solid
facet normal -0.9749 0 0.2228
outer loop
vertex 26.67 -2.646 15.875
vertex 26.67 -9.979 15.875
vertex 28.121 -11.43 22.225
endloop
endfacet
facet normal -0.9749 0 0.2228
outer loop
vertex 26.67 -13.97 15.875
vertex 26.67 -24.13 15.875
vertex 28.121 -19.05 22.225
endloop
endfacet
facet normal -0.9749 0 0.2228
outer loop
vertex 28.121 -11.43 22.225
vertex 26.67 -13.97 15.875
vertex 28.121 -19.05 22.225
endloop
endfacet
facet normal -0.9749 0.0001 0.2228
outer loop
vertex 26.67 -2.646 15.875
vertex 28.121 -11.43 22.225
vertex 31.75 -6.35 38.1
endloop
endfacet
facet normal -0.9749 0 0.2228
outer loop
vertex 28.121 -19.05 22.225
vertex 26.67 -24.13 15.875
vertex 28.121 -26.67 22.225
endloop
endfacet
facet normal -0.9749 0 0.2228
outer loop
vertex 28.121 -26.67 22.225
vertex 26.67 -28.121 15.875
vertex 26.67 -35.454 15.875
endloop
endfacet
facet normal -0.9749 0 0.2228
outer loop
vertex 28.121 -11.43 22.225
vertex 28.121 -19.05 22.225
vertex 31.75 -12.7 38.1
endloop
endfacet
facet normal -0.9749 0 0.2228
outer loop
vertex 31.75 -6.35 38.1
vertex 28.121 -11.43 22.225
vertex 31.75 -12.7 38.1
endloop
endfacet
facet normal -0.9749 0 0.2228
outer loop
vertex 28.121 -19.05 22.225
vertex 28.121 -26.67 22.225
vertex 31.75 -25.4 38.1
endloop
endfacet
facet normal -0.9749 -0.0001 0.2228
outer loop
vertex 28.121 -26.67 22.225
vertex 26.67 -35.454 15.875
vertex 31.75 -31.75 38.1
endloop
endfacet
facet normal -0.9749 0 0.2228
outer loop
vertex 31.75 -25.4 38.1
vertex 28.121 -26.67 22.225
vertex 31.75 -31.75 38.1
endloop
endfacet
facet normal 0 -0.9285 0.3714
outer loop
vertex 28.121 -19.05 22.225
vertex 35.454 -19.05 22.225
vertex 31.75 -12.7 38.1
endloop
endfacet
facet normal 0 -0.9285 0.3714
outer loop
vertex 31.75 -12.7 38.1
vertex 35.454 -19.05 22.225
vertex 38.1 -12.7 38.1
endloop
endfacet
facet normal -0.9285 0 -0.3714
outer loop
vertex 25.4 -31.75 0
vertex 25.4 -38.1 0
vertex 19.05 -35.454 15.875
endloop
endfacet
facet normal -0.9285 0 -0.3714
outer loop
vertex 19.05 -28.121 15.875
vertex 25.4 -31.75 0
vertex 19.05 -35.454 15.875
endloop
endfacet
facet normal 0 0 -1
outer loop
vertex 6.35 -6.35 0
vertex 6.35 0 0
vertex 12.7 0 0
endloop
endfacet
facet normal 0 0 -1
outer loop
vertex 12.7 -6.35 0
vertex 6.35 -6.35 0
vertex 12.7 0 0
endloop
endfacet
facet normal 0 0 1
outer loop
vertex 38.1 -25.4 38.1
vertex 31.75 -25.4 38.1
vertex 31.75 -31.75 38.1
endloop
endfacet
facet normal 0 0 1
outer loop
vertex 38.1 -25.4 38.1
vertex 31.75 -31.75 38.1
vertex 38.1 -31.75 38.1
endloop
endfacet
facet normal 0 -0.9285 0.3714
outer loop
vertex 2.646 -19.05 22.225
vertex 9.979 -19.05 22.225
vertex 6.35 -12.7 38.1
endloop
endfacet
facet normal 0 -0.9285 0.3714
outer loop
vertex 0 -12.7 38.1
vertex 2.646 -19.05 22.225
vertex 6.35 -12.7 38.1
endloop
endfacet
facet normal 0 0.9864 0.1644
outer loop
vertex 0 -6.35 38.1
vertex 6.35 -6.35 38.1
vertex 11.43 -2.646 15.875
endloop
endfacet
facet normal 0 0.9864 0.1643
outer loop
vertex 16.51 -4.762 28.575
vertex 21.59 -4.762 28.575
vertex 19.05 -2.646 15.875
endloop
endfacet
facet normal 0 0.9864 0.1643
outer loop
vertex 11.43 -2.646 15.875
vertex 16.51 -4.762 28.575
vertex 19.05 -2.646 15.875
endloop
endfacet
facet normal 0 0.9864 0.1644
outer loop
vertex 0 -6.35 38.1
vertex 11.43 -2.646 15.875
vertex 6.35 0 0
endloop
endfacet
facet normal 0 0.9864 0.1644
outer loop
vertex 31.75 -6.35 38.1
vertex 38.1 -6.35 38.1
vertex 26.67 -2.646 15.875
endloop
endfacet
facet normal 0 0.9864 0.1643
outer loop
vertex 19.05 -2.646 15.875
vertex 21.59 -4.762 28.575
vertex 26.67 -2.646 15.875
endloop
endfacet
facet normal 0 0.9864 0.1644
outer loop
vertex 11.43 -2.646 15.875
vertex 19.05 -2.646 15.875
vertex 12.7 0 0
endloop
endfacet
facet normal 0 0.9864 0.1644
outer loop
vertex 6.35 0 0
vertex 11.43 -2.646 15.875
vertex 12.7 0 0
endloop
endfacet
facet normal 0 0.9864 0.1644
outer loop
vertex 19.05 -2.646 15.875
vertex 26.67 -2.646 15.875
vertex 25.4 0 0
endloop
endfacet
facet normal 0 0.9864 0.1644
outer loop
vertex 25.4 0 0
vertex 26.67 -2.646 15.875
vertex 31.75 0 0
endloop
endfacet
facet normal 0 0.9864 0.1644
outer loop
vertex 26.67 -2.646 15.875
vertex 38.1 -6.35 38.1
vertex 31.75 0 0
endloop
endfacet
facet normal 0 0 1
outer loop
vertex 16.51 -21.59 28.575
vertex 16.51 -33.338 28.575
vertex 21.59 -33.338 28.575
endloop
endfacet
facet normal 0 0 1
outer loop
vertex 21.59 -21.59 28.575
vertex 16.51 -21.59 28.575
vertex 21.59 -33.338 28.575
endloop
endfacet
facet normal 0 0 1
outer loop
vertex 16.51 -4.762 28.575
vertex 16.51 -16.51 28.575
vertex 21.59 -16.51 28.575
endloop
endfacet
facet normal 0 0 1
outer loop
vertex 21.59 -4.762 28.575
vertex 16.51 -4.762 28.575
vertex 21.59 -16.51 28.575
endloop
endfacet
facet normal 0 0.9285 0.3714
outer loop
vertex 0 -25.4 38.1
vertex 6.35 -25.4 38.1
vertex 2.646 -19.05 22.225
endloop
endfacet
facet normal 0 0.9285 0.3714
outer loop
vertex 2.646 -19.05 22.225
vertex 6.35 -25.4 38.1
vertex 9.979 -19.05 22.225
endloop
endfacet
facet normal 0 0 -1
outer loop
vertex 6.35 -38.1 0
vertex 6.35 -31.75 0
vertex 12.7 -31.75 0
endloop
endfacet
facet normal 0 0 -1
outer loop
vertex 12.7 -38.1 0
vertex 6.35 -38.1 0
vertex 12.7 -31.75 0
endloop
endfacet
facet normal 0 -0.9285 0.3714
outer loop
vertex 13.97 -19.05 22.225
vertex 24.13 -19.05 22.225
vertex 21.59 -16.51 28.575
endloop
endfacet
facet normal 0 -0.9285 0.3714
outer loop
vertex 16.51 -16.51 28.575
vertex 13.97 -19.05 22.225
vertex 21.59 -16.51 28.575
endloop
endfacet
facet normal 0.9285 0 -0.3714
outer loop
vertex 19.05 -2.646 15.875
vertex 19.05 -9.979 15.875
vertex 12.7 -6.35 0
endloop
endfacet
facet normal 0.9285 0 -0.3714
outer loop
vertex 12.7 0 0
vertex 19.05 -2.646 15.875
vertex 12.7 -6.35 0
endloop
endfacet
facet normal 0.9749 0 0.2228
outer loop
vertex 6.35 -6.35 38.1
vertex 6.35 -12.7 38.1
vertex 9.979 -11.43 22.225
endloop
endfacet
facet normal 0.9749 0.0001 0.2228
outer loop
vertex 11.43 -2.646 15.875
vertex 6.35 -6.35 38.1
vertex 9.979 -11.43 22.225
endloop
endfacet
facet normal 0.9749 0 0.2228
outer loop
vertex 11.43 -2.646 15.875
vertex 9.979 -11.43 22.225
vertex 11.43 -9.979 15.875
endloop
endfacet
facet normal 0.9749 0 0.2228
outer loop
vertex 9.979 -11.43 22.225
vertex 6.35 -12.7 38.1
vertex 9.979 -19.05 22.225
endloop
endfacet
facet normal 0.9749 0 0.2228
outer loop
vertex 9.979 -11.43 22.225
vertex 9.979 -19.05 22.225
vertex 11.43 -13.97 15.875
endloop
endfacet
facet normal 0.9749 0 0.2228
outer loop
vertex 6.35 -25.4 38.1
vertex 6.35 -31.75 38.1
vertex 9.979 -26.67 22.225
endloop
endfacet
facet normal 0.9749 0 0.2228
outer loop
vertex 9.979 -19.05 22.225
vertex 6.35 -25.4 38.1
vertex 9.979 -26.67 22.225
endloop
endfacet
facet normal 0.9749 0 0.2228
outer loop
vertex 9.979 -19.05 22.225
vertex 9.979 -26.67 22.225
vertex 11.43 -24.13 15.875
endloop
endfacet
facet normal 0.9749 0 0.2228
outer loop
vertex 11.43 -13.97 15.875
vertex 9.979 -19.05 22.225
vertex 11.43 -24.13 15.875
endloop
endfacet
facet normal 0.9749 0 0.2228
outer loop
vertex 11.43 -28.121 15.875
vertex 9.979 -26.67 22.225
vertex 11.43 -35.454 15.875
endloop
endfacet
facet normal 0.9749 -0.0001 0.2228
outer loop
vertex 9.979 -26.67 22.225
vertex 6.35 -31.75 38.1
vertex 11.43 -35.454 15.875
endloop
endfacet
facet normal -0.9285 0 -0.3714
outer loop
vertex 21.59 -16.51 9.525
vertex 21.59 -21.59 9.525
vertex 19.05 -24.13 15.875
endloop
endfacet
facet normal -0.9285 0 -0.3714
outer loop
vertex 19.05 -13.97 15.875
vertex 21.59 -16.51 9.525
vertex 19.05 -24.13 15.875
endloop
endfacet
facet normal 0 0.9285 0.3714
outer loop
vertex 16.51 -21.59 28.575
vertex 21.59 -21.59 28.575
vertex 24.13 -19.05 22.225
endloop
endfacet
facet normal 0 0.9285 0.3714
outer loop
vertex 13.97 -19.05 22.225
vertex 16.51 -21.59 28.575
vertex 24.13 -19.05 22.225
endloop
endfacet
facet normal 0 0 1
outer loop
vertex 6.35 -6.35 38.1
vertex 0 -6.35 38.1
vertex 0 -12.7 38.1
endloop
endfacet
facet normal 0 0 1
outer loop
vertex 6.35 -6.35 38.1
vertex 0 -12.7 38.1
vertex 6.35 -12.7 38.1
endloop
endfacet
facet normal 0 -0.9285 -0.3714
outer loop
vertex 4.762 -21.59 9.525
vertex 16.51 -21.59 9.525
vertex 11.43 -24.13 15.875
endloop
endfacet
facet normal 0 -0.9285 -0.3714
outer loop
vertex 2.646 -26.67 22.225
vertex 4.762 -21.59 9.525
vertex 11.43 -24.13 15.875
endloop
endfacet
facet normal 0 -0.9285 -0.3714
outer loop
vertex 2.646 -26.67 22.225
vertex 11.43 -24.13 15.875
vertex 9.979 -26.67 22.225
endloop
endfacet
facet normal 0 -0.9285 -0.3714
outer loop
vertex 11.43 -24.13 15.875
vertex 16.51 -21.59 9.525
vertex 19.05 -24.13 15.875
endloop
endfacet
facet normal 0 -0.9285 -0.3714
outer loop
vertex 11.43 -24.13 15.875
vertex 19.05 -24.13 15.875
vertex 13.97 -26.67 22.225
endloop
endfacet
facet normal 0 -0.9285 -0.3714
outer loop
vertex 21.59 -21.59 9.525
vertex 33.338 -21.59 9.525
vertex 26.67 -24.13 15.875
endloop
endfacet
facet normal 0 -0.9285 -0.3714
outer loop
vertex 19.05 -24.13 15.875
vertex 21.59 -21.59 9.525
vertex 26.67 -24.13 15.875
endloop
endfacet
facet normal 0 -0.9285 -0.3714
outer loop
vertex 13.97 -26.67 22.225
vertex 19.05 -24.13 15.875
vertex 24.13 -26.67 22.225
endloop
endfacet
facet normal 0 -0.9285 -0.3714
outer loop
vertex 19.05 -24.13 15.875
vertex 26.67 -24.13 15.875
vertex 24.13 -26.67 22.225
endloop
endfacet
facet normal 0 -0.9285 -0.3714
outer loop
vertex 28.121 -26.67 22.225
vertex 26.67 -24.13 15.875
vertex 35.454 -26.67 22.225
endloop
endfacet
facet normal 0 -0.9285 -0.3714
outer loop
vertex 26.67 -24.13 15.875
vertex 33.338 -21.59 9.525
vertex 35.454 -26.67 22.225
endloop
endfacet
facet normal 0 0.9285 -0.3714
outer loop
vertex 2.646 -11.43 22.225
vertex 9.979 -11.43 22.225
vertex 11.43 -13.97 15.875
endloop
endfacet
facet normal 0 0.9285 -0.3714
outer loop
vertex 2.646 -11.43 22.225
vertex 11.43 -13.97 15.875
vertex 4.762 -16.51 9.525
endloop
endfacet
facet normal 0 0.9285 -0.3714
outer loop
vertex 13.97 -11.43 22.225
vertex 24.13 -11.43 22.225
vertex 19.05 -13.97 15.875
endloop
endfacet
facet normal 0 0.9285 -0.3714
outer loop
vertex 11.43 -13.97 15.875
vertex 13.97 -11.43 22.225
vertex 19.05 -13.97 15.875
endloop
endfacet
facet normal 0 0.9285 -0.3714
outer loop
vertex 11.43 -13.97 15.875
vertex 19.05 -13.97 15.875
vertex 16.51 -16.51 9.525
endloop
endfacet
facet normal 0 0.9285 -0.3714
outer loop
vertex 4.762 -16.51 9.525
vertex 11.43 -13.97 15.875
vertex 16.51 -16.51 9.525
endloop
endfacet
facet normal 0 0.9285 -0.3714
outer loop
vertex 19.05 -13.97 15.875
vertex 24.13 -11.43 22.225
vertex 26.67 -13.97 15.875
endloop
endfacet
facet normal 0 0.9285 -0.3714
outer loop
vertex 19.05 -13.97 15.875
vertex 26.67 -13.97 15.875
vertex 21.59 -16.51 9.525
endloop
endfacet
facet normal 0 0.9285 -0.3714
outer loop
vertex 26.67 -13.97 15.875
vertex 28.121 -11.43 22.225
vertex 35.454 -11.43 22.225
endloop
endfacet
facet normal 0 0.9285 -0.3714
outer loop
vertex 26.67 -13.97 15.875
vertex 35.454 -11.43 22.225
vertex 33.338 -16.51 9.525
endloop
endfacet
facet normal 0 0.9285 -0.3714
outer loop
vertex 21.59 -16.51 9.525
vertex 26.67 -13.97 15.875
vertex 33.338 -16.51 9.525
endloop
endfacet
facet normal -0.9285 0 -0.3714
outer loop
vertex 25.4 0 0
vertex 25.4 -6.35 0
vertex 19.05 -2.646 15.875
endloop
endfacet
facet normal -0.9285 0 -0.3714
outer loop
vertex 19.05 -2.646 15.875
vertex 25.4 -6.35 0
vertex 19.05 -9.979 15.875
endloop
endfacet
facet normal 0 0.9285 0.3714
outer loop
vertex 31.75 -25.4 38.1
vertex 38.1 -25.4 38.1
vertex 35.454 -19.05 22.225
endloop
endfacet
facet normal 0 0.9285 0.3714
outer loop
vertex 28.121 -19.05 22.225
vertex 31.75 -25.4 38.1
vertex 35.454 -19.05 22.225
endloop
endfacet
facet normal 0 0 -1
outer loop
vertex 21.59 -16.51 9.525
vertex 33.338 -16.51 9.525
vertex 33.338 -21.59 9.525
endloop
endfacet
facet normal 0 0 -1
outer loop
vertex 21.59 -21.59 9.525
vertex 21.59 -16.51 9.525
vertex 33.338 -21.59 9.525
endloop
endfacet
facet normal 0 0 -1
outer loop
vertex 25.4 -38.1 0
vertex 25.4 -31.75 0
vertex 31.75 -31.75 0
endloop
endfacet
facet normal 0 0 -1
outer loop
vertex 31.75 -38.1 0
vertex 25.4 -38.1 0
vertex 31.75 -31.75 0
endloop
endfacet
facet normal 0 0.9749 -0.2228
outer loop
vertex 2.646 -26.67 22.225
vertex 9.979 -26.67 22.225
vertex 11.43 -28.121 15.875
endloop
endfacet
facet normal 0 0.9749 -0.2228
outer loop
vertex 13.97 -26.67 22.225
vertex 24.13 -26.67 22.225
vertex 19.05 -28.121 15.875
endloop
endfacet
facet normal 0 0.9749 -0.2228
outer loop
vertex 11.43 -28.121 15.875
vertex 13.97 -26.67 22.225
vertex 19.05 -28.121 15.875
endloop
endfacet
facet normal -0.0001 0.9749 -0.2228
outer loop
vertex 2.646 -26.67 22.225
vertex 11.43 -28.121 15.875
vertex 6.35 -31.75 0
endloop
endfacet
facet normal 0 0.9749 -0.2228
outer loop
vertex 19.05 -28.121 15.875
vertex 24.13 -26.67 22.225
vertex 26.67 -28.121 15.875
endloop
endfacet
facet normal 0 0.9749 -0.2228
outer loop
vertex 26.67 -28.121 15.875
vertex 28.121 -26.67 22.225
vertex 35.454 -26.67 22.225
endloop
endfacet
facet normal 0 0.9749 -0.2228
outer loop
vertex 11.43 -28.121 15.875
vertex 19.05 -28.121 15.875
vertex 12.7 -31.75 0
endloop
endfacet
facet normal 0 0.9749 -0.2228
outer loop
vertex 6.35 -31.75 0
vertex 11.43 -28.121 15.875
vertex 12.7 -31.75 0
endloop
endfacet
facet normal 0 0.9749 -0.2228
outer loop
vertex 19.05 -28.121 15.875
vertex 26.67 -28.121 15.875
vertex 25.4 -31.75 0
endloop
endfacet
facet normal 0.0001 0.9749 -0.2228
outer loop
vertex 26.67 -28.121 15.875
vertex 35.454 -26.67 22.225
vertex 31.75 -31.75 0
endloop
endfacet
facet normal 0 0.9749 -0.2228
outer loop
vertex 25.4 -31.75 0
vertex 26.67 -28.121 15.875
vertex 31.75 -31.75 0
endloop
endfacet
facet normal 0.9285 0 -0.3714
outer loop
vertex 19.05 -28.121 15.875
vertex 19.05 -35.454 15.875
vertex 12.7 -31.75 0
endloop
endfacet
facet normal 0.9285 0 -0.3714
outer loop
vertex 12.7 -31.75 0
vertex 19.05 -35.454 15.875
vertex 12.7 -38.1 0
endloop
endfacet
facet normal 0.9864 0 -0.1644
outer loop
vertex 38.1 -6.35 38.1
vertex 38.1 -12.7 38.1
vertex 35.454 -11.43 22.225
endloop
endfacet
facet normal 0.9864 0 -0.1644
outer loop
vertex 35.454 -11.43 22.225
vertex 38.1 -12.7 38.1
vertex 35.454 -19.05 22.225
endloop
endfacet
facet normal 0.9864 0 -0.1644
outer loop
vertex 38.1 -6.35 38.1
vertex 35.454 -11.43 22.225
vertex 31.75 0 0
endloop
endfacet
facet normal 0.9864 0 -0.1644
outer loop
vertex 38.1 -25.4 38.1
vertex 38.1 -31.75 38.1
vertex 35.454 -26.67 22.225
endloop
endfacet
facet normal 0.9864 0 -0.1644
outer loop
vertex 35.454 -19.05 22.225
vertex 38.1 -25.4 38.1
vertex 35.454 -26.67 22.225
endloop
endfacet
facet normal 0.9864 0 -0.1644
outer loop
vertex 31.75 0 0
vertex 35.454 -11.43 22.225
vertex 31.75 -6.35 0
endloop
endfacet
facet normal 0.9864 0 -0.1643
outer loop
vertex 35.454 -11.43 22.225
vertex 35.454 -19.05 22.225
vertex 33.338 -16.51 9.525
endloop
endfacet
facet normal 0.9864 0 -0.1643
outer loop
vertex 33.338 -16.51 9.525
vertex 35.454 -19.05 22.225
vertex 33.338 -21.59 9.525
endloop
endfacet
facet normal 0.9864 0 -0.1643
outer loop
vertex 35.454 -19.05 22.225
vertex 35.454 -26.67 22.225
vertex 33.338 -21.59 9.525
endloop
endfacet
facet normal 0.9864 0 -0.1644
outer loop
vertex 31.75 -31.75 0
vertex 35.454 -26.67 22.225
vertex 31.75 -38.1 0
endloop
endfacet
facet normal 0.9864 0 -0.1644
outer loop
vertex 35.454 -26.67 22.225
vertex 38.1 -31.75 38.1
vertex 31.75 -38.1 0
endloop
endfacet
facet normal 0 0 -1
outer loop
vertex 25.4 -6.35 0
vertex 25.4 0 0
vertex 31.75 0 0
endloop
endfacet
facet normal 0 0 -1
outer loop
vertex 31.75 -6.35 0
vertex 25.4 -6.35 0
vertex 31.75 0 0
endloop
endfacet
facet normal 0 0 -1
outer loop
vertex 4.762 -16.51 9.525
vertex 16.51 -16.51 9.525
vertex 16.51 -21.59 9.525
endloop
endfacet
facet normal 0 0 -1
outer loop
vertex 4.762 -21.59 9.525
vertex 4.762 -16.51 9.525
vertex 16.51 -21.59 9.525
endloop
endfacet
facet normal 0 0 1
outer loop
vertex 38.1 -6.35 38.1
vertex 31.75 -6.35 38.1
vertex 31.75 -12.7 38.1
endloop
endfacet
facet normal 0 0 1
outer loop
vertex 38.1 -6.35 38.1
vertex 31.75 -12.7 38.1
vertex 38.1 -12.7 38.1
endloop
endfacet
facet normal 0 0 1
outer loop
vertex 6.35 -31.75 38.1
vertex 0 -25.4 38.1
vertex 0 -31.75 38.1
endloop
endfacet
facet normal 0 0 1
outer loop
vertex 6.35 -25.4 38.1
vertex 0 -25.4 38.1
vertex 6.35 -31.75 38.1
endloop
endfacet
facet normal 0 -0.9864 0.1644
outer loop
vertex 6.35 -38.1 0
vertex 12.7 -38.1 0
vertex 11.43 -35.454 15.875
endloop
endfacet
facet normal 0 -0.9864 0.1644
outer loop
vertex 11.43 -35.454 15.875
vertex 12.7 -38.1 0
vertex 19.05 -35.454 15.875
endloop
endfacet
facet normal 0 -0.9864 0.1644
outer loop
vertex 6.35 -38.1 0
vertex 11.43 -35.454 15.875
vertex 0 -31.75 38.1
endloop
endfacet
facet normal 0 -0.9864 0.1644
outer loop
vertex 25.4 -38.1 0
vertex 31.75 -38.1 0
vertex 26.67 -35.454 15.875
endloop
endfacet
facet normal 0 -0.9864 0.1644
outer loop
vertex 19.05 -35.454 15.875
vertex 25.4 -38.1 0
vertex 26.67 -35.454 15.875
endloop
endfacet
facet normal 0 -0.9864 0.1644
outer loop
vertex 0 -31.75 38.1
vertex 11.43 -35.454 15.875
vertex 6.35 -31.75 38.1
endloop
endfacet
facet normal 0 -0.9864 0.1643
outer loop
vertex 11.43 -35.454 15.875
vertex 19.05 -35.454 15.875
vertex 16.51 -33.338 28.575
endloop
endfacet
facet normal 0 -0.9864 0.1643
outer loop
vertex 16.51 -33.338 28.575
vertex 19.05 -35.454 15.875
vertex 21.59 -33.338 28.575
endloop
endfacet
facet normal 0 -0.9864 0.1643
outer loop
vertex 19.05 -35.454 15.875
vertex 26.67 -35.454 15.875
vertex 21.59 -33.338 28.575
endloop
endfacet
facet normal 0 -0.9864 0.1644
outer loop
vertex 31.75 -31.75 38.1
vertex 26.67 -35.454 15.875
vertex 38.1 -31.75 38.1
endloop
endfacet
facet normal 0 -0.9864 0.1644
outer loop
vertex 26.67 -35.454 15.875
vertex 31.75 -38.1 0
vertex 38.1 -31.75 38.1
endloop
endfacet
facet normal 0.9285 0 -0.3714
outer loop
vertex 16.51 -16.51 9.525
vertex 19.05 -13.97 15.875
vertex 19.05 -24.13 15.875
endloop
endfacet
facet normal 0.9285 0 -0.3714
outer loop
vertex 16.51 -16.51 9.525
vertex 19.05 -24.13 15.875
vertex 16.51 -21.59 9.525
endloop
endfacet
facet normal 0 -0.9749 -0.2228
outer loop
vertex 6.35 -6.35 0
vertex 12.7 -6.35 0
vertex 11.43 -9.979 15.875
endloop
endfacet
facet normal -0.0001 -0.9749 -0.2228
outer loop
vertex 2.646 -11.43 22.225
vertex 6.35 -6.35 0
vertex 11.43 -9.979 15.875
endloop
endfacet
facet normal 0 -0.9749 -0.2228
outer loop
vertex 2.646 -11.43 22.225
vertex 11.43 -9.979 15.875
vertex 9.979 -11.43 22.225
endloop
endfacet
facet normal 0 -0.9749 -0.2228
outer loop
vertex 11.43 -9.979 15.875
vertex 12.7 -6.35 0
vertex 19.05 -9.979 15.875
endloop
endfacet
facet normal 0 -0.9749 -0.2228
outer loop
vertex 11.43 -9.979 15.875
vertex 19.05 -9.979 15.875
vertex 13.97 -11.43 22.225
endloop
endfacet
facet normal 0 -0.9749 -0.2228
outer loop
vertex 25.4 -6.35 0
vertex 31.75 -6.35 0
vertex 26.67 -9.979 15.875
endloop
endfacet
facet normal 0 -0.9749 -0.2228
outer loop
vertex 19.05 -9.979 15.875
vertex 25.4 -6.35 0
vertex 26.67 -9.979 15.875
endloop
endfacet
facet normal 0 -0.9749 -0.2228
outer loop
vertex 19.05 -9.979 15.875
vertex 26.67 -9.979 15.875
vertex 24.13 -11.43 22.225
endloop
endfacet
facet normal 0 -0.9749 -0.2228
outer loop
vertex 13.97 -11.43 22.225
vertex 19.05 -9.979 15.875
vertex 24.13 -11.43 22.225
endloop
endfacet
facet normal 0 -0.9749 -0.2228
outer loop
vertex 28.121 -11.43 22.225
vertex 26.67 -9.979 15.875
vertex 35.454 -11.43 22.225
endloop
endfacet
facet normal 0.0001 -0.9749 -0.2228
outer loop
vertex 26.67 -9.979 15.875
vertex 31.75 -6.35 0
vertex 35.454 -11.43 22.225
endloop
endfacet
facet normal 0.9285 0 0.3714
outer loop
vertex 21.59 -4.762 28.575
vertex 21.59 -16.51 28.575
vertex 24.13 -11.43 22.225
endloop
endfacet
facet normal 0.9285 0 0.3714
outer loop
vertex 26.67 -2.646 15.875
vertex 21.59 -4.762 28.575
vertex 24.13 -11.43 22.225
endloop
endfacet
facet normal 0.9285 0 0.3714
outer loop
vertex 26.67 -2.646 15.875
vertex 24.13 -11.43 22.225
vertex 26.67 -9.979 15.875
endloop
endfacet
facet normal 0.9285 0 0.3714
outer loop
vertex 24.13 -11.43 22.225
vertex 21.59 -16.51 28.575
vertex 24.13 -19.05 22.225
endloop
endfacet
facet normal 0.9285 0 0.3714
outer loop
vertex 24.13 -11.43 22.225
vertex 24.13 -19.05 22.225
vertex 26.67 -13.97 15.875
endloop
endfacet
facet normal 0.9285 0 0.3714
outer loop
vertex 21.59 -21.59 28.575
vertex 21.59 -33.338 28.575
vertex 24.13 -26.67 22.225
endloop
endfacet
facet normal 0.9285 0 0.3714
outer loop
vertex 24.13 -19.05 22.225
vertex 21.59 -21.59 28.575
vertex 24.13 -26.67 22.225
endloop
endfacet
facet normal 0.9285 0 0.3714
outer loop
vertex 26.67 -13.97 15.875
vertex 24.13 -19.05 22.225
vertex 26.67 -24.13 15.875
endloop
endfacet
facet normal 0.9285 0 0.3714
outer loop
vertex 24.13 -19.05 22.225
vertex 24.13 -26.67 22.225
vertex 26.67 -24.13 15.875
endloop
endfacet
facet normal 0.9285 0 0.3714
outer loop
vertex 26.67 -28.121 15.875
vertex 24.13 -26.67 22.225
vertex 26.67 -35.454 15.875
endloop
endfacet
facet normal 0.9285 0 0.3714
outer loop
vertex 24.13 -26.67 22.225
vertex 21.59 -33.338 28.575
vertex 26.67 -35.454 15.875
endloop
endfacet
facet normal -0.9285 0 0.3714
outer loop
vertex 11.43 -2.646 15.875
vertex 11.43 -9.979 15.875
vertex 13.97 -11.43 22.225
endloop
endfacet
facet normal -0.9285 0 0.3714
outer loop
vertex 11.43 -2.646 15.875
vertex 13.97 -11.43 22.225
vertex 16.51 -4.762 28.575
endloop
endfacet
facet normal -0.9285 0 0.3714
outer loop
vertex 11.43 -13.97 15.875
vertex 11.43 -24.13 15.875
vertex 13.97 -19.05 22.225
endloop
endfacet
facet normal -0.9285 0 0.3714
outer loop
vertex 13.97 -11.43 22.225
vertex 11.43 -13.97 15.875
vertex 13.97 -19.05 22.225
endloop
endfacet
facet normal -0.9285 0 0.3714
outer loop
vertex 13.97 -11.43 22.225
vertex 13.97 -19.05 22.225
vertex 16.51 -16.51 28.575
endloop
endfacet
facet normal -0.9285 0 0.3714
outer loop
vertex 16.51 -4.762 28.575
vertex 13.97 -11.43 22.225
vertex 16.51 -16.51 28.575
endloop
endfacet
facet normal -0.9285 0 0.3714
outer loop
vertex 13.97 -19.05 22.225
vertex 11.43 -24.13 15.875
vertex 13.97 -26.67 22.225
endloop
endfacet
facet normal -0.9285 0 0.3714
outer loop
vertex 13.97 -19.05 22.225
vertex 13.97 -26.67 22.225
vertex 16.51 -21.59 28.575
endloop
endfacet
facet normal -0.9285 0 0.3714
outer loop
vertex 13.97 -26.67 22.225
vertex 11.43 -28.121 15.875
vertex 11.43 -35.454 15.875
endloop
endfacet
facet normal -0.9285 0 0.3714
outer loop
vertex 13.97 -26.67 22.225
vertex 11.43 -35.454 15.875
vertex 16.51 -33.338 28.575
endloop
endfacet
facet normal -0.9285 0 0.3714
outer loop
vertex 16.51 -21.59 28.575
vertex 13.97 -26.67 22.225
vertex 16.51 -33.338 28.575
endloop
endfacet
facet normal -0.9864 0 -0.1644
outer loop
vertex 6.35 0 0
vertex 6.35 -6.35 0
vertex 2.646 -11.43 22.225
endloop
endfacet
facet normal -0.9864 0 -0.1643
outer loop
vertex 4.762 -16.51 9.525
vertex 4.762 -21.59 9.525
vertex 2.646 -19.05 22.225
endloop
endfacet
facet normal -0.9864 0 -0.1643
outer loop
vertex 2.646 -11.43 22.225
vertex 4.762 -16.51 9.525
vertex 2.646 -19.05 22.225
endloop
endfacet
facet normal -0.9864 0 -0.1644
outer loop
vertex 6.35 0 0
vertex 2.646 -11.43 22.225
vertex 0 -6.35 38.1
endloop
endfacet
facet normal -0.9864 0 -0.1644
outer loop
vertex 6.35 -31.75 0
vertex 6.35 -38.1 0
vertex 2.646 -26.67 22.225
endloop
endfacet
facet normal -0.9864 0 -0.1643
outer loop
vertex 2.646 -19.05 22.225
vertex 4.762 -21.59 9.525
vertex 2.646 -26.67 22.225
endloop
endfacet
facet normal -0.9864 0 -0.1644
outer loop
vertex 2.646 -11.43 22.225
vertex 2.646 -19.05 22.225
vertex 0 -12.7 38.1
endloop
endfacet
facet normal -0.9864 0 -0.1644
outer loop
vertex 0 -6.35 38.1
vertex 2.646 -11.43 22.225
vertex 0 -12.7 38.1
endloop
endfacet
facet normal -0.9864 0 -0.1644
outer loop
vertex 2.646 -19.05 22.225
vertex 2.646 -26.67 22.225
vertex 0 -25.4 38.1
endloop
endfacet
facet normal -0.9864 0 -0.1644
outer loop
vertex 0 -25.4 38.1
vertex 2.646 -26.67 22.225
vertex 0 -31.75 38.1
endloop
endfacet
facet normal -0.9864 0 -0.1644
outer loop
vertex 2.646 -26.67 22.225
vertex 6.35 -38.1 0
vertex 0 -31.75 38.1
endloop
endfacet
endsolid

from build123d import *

# Parameters (mm, degrees)
F0_W     = 38.1
F0_H     = 38.1
F1_DEPTH = 38.1
F6_DEPTH = 38.1
F8_DEPTH = 38.1


with BuildPart() as f1:
    # F0 (on Front) → F1 (new body)
    with BuildSketch(Plane.XZ):
        with Locations((19.05, 19.05)):
            Rectangle(F0_W, F0_H)
    extrude(amount=F1_DEPTH)

    # F5 (on offset) → F6 (cut)
    with BuildSketch(Plane.XZ.offset(38.1)):
        Polygon((31.75, 38.1), (6.35, 38.1), (11.43, 15.875), (16.51, 28.575), (21.59, 28.575), (26.67, 15.875), align=None)
        Polygon((0, 0), (6.35, 0), (0, 38.1), align=None)
        Polygon((19.05, 15.875), (12.7, 0), (25.4, 0), align=None)
        Polygon((38.1, 38.1), (31.75, 0), (38.1, 0), align=None)
    extrude(amount=-F6_DEPTH, mode=Mode.SUBTRACT)

    # F7 (on offset) → F8 (cut)
    with BuildSketch(Plane.YZ.offset(38.1)):
        Polygon((-26.67, 22.225), (-31.75, 0), (-6.35, 0), (-11.43, 22.225), (-16.51, 9.525), (-21.59, 9.525), align=None)
        Polygon((-31.75, 38.1), (-38.1, 38.1), (-38.1, 0), align=None)
        Polygon((-6.35, 38.1), (0, 0), (0, 38.1), align=None)
        Polygon((-12.7, 38.1), (-25.4, 38.1), (-19.05, 22.225), align=None)
    extrude(amount=-F8_DEPTH, mode=Mode.SUBTRACT)


solid = f1.part
